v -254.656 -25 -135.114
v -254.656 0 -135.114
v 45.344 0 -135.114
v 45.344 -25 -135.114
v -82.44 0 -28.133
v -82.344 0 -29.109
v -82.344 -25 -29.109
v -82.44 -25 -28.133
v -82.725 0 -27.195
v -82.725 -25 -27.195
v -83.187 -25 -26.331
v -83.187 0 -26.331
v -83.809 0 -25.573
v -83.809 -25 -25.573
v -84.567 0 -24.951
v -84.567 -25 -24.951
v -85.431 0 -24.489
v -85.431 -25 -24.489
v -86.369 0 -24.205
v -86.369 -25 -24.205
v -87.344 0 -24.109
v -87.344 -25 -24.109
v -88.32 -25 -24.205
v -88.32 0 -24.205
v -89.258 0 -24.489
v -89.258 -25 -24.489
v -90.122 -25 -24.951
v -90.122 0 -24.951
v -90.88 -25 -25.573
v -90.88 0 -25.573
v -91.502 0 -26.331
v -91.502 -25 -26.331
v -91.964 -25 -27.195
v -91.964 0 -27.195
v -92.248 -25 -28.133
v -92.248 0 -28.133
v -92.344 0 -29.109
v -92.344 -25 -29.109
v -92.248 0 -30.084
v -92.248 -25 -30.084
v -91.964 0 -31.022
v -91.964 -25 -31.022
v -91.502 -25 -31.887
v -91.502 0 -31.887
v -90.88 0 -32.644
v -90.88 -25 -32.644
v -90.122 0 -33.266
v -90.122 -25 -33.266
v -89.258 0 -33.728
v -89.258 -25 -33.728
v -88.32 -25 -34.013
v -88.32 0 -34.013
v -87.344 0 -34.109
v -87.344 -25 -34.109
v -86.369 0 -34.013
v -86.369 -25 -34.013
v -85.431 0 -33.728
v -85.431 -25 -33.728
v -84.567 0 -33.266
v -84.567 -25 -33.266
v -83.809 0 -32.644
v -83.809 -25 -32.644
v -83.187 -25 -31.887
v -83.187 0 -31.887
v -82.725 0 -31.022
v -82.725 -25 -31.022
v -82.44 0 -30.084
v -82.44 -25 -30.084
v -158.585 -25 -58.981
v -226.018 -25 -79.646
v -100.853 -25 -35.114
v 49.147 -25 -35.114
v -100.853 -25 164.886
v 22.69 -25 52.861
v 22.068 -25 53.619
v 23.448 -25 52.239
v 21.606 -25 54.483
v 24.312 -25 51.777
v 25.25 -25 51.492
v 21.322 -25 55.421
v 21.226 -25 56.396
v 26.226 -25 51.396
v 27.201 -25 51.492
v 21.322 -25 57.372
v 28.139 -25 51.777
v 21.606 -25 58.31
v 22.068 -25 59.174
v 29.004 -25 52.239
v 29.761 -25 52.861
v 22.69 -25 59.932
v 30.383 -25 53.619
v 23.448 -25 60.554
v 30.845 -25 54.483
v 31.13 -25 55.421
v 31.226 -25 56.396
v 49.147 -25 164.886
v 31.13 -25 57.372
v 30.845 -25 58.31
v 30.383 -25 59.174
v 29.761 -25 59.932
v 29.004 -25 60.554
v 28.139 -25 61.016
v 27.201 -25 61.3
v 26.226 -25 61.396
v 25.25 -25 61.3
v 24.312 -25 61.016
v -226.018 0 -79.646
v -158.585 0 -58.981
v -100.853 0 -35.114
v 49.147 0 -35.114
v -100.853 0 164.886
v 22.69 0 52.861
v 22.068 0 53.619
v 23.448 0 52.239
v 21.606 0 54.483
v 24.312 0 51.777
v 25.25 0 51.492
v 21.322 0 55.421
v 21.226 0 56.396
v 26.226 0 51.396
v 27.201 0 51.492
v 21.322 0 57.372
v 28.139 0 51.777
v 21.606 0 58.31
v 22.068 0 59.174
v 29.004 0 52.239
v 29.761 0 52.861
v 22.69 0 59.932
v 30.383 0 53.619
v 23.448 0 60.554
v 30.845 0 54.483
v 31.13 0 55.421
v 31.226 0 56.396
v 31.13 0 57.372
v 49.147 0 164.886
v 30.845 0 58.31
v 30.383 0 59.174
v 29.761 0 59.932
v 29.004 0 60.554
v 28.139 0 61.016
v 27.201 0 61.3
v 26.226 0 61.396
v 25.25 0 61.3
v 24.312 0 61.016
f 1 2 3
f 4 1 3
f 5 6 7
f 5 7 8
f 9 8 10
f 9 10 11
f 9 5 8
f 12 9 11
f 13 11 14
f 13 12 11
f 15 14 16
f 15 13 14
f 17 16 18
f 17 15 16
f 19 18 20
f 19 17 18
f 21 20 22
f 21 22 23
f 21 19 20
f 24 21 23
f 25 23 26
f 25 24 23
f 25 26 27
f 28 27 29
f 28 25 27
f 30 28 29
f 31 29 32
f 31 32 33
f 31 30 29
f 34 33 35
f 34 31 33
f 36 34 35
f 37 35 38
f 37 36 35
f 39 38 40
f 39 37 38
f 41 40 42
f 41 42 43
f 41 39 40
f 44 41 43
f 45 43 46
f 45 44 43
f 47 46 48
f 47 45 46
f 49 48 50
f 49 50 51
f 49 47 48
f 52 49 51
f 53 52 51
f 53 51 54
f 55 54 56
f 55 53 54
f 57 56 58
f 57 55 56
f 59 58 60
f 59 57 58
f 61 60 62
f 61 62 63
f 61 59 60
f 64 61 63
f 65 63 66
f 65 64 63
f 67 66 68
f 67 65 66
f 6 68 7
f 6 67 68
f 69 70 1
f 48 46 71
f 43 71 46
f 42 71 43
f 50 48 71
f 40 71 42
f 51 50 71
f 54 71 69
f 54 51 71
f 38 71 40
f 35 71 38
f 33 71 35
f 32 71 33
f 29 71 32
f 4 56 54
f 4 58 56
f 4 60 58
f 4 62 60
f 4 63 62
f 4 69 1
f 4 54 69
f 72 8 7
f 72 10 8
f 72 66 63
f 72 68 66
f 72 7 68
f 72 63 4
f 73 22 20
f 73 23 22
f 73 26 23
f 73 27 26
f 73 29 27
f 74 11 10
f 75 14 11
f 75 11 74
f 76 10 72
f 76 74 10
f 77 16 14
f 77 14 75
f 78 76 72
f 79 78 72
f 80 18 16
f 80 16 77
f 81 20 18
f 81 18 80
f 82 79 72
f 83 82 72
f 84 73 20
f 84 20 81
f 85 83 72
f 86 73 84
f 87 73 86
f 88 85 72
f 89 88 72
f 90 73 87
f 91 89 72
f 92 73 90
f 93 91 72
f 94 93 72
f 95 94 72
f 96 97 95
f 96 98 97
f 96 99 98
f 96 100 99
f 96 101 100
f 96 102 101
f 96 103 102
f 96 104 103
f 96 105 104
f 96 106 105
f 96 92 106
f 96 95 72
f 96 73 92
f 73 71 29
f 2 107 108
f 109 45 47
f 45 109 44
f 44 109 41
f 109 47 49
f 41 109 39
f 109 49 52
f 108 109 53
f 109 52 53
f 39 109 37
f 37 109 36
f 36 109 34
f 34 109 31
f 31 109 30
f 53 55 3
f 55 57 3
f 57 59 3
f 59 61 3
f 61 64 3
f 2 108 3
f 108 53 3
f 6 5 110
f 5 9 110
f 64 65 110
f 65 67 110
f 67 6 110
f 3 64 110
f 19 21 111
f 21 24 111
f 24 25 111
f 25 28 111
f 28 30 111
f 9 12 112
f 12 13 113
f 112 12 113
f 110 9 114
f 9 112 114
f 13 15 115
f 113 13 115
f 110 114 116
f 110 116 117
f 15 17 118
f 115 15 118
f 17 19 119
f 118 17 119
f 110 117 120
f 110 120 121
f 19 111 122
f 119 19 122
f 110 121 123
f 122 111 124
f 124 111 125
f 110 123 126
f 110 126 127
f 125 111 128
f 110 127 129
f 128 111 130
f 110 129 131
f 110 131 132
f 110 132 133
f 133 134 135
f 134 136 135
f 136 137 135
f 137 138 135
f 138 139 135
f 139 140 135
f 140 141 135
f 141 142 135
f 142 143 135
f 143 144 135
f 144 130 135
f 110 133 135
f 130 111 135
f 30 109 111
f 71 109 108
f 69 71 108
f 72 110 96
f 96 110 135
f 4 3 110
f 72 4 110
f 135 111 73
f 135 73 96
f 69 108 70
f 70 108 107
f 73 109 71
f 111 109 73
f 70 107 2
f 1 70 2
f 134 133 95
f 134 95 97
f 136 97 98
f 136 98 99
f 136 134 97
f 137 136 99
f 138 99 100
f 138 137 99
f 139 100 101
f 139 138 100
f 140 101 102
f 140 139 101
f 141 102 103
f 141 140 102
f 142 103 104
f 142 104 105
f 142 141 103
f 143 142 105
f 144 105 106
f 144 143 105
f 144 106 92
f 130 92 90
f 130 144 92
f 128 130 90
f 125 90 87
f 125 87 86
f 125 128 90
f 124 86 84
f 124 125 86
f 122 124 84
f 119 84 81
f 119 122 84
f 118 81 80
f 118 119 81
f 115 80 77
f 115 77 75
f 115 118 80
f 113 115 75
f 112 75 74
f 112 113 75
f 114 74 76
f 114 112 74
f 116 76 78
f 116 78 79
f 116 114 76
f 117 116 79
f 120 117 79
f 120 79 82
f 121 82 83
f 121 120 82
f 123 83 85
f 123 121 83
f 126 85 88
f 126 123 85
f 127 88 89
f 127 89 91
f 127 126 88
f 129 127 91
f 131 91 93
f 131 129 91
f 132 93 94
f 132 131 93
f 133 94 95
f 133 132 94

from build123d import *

# Parameters (mm, degrees)
F0_W     = 150
F0_H     = 200
F0_R     = 5
F1_DEPTH = 25


with BuildPart() as f1:
    # F0 (on Front) → F1 (new body)
    with BuildSketch(Plane.XZ):
        with Locations((-25.85324, 64.885747)):
            Rectangle(F0_W, F0_H)
        with Locations((-87.344356, -29.108832)):
            Circle(F0_R, mode=Mode.SUBTRACT)
        with Locations((26.225695, 56.396399)):
            Circle(F0_R, mode=Mode.SUBTRACT)
        Polygon((49.14676, -35.114253), (-100.85324, -35.114253), (-158.585042, -58.980666), (-226.017654, -79.6455), (-254.655804, -135.114253), (45.344196, -135.114253), align=None)
    extrude(amount=F1_DEPTH)


solid = f1.part
